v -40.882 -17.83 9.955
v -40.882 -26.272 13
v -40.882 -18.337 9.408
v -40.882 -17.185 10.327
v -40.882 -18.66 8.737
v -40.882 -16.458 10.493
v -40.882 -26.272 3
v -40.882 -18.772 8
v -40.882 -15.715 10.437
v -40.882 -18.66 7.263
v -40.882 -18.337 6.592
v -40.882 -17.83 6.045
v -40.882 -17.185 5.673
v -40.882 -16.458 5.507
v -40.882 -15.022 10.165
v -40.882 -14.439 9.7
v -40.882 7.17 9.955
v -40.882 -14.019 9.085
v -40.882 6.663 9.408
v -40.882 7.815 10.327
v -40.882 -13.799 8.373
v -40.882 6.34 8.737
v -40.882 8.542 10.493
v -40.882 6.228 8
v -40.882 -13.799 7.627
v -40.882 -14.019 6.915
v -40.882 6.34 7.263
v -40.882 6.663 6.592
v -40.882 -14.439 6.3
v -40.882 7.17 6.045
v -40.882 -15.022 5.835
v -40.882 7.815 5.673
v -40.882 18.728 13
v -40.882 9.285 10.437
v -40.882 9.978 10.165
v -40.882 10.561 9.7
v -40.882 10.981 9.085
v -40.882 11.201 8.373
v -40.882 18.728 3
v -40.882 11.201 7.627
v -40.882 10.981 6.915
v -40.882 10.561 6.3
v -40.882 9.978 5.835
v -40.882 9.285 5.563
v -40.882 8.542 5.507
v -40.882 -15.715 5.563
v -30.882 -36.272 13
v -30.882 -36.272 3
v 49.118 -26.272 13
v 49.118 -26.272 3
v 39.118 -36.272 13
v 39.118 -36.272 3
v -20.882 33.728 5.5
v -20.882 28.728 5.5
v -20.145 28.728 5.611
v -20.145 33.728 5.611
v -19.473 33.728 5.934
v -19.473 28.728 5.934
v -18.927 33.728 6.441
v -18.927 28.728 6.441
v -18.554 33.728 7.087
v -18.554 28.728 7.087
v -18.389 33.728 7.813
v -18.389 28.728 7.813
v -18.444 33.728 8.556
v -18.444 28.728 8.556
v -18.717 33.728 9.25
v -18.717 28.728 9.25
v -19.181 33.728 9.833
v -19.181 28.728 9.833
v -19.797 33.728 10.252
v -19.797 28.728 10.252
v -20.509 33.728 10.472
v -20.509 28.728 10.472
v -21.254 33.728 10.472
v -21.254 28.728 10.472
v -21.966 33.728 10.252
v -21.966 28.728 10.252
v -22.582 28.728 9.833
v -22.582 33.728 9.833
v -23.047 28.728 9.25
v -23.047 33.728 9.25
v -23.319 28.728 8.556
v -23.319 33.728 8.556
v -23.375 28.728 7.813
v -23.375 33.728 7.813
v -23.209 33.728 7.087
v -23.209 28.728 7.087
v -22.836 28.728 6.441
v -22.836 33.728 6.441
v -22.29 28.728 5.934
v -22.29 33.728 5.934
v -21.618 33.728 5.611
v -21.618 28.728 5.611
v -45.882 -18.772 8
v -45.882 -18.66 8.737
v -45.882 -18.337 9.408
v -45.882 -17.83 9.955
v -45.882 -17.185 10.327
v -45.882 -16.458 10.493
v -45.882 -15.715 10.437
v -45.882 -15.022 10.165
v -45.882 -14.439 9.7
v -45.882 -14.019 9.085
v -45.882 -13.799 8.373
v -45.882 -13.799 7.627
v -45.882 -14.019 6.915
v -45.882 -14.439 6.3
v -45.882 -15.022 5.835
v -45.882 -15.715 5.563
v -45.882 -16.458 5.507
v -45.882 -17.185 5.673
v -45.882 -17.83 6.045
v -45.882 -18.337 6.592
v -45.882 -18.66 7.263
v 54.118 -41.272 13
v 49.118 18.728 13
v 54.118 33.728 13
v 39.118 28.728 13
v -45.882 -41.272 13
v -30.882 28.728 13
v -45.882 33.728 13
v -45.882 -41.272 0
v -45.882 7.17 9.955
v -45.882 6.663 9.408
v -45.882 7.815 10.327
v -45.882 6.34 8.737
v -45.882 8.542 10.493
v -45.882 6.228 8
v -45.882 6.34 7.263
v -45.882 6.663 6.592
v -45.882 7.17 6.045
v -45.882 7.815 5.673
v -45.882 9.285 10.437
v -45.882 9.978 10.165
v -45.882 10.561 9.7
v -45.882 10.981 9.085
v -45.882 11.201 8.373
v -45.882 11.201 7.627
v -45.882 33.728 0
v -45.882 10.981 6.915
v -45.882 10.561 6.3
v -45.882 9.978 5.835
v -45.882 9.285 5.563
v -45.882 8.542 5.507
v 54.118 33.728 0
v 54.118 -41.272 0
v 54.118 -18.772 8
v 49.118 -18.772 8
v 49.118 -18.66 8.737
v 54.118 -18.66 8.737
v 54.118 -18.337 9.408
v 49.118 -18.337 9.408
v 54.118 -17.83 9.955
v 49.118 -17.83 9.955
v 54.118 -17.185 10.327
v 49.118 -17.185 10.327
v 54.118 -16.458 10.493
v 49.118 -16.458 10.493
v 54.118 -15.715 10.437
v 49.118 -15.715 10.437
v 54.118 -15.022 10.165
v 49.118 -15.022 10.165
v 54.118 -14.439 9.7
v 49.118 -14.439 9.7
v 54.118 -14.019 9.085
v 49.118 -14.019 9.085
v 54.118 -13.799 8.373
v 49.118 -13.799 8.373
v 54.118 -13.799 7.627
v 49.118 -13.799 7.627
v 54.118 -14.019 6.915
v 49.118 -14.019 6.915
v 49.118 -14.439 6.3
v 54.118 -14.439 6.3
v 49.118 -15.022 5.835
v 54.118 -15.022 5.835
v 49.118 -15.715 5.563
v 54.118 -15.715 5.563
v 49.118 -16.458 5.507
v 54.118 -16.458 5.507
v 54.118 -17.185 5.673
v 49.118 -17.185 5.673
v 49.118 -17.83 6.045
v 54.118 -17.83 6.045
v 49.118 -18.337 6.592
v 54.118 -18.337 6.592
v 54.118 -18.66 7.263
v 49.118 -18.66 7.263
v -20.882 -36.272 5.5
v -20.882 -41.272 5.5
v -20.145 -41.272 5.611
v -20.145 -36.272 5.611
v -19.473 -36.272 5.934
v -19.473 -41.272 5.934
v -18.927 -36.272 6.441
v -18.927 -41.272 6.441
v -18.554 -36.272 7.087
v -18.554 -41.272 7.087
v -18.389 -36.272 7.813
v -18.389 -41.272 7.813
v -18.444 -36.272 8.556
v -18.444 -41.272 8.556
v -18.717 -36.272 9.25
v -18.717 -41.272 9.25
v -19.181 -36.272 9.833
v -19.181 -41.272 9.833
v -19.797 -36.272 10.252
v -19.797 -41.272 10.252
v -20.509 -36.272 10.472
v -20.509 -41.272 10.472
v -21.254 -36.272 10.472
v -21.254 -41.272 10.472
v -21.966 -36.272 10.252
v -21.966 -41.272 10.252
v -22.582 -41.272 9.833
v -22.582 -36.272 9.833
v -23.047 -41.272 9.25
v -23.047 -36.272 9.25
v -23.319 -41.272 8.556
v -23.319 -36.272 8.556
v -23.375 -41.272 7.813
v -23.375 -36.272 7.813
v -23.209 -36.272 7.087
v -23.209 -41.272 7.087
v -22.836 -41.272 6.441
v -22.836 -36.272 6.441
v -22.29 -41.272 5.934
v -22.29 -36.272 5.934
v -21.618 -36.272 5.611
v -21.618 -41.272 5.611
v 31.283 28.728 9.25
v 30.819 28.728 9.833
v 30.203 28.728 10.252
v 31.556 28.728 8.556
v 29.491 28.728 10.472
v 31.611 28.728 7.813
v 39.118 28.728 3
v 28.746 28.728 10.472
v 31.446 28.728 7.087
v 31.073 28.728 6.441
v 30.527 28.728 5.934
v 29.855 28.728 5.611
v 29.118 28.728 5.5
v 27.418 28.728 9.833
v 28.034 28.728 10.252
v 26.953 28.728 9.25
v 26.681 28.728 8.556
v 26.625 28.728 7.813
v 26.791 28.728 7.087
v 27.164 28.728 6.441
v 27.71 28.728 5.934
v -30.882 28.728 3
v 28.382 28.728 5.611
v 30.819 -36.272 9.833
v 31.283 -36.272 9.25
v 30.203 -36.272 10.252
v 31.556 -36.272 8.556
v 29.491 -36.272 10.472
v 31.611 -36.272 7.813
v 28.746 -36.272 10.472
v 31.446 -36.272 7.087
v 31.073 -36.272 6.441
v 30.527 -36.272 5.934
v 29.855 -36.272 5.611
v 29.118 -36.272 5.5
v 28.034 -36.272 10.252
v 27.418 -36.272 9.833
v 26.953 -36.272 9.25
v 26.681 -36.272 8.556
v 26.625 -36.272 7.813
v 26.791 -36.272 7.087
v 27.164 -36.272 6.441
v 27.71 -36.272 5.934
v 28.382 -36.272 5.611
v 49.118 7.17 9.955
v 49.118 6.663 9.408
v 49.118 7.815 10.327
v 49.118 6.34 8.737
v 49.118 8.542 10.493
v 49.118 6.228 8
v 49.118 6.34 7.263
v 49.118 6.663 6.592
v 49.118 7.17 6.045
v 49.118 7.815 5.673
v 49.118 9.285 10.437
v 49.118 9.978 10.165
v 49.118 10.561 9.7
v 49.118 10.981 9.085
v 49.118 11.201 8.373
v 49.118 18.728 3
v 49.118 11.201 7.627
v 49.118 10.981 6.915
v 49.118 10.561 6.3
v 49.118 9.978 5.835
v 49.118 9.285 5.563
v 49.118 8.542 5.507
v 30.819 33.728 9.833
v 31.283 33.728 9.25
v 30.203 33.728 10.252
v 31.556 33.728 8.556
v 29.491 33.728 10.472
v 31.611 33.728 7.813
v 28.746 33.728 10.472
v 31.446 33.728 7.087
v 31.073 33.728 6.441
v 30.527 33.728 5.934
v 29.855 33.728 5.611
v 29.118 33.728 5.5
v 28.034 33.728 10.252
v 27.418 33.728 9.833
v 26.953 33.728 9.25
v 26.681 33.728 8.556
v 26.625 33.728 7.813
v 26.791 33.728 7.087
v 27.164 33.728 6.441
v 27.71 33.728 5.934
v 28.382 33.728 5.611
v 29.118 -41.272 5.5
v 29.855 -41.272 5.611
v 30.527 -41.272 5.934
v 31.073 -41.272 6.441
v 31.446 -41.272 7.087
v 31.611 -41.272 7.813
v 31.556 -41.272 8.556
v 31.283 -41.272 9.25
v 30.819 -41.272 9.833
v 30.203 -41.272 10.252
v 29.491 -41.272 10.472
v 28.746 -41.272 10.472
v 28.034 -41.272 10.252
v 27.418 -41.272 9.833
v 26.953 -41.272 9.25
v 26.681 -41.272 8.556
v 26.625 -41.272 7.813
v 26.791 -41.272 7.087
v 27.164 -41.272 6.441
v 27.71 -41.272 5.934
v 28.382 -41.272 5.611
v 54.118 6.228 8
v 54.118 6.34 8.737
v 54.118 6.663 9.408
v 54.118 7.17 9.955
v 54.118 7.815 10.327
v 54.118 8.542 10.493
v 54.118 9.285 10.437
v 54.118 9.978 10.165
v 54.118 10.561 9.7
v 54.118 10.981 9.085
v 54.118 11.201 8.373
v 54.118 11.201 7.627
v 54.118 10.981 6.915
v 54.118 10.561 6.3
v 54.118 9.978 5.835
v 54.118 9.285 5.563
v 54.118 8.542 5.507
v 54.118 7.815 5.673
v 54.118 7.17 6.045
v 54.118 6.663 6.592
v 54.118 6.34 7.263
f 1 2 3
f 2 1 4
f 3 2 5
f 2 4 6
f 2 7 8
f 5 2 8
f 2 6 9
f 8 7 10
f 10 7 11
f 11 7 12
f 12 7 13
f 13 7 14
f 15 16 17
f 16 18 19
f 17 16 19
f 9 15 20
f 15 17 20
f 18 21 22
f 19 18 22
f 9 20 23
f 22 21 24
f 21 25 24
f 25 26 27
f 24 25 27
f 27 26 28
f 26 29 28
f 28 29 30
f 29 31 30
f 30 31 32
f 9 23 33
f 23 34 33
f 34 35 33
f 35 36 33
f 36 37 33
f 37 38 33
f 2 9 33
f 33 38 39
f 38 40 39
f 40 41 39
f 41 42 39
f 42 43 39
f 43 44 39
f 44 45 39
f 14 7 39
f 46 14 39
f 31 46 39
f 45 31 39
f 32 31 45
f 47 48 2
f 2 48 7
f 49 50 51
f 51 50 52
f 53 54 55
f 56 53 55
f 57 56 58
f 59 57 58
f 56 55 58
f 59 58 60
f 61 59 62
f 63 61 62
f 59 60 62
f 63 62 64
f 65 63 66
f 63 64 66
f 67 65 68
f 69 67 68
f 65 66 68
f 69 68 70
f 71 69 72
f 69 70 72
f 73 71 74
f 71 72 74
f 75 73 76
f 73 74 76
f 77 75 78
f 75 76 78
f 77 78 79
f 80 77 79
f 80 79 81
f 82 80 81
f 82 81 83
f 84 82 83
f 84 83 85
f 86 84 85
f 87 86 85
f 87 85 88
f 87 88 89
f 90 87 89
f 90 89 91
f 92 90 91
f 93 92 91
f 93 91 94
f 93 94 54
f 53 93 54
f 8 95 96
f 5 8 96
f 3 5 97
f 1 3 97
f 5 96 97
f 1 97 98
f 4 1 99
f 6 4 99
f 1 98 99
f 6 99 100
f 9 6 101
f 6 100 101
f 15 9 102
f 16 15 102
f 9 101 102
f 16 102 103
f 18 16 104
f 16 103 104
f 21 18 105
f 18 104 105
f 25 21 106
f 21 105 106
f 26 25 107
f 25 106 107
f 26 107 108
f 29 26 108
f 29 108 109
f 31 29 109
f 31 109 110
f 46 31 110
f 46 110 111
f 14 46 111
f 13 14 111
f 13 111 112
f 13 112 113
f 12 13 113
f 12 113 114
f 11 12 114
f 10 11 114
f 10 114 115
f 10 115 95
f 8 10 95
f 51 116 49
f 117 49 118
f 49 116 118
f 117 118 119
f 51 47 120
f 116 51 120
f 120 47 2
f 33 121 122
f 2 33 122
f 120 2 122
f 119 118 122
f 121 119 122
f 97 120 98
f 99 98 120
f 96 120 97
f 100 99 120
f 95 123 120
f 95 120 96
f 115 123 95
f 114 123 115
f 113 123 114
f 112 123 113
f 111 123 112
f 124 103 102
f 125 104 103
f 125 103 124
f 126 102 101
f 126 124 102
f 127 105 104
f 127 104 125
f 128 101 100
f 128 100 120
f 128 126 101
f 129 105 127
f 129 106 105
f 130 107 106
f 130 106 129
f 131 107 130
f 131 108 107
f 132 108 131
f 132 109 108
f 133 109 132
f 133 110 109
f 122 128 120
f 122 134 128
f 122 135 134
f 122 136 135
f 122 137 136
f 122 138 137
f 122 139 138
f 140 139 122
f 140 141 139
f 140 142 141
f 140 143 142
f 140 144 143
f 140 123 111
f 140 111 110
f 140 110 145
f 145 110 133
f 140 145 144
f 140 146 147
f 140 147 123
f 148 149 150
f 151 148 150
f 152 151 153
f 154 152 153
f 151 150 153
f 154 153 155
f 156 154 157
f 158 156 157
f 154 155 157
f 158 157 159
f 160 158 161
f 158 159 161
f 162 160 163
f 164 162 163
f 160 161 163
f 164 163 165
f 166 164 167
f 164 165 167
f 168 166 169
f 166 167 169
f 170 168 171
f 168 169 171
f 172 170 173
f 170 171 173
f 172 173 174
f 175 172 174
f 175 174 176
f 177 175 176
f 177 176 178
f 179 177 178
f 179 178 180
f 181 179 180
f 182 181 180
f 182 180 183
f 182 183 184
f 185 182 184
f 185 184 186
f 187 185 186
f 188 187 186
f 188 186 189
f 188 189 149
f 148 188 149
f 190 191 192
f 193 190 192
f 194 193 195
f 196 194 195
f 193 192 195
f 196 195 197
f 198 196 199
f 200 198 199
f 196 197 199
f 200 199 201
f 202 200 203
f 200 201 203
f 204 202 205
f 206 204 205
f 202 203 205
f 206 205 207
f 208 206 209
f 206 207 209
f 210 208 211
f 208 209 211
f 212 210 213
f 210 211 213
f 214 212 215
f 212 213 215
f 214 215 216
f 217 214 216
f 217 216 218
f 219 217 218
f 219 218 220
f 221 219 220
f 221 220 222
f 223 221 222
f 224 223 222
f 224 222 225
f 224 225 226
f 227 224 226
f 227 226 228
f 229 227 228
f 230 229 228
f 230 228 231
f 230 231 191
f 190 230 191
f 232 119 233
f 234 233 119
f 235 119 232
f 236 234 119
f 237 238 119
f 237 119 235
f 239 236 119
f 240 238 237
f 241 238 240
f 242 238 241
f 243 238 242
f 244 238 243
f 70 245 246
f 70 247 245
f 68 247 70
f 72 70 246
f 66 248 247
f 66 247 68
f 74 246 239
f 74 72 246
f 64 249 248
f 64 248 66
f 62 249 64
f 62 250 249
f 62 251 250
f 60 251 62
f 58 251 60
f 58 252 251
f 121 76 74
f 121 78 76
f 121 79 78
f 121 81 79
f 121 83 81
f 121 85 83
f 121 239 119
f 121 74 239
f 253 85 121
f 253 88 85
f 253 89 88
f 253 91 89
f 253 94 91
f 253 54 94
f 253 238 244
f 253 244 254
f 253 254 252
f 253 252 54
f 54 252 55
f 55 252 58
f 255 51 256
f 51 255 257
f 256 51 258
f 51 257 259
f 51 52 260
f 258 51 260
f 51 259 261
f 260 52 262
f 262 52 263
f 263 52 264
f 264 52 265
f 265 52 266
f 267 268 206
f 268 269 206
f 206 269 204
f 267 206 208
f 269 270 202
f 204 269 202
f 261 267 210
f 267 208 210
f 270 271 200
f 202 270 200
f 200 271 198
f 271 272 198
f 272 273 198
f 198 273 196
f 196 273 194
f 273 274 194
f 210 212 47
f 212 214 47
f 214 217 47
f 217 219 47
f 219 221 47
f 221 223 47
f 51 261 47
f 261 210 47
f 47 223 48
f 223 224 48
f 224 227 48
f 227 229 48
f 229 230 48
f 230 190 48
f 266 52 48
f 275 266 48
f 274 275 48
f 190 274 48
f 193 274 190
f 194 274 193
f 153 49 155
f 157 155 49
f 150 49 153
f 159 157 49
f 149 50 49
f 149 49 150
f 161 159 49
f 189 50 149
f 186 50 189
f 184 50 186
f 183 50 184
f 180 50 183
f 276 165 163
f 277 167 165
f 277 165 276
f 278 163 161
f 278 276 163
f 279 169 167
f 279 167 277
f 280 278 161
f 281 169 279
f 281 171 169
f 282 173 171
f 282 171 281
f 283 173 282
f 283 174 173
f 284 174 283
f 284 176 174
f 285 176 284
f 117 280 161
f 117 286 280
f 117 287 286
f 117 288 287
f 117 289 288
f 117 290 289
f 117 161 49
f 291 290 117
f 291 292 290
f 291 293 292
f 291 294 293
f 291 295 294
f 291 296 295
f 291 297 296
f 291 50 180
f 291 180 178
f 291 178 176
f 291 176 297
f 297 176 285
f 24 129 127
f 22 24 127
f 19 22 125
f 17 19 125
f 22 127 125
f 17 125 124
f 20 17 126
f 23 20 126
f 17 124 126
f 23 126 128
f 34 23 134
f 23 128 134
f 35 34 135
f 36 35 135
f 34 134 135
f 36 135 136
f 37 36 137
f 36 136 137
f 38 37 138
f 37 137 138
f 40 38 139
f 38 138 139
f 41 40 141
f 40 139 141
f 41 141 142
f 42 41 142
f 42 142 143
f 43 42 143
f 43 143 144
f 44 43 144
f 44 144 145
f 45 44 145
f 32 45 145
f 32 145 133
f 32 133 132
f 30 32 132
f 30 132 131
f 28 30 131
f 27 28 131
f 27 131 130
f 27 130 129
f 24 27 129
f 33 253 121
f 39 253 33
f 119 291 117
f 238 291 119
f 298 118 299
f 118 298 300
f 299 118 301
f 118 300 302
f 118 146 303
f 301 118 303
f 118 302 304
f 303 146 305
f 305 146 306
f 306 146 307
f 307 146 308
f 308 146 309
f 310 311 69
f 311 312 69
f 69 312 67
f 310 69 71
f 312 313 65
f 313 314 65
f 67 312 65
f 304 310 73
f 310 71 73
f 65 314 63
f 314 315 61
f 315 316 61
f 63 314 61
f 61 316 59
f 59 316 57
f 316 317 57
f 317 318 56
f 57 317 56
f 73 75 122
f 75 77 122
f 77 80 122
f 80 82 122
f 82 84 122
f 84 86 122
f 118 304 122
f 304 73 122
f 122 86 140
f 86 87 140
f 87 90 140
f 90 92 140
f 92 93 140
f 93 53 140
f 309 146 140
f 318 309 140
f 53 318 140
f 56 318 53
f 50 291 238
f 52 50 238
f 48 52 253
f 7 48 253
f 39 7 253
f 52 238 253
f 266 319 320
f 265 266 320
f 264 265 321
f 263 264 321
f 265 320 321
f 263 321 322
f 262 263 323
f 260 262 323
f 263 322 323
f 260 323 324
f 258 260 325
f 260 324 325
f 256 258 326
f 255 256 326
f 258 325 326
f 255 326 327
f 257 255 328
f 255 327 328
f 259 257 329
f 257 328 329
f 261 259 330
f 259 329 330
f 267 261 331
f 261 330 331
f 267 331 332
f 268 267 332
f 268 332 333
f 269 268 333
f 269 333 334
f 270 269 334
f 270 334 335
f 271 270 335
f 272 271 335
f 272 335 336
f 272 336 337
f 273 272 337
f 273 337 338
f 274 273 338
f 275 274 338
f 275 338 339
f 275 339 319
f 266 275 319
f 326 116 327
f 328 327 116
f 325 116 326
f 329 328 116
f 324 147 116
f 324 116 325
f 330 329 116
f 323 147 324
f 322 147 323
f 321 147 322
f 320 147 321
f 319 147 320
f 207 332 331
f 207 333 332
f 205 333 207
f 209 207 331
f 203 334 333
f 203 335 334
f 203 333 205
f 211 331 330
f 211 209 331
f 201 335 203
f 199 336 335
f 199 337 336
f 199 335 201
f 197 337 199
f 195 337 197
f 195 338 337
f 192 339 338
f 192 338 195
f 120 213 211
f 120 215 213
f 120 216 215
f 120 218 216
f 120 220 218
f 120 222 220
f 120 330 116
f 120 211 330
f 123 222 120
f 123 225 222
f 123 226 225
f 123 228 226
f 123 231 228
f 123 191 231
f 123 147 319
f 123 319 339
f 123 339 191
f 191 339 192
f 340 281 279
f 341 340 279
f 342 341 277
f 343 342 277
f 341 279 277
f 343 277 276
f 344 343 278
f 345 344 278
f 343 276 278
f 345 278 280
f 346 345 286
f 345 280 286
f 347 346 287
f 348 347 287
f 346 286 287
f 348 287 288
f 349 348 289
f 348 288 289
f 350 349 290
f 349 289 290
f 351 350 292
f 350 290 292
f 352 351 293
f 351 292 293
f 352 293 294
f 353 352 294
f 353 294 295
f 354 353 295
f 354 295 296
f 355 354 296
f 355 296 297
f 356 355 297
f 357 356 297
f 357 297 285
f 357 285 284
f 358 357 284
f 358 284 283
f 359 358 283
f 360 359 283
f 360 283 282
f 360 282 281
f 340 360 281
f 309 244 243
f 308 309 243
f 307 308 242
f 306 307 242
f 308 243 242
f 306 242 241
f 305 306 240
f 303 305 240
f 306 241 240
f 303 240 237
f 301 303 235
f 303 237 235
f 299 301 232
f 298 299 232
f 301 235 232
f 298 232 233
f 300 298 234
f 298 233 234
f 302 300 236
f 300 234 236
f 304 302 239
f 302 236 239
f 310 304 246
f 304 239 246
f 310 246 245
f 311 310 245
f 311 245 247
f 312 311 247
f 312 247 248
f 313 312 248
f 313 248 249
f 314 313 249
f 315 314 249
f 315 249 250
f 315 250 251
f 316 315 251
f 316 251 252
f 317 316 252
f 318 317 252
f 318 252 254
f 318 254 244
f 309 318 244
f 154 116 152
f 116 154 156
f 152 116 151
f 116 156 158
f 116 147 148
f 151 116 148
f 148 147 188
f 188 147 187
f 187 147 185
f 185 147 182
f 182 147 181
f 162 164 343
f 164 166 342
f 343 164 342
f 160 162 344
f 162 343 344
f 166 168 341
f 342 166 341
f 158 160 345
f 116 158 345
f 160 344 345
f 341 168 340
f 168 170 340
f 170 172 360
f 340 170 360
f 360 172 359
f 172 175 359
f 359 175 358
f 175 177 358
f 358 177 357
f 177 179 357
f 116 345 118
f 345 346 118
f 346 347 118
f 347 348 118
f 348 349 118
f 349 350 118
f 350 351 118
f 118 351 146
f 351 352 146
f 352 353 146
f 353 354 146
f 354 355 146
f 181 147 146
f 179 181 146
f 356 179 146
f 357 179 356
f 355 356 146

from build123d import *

# Parameters (mm, degrees)
BOSS_EXTRU_1_DEPTH        = 13
COQUE1_T                  = -5
COQUE1_THICKNESS_2_FACE_W = 90
COQUE1_THICKNESS_2_FACE_H = 65
COQUE1_THICKNESS_2_DEPTH  = 2
ENL_V_MAT_EXTRU_1_REACH   = 110.96
ESQUISSE2_R               = 2.5
ENL_V_MAT_EXTRU_2_REACH   = 95.396
ESQUISSE3_R               = 2.5
BOSS_EXTRU_2_DEPTH        = 10


with BuildPart() as part:
    # Esquisse1 → Boss.-Extru.1 (new body)
    with BuildSketch(Plane.XY):
        Polygon((44.118436308, 33.728448276), (54.118436308, 33.728448276), (54.118436308, 23.728448276), (54.118436308, -41.271551724), (-45.881563692, -41.271551724), (-45.881563692, 33.728448276), align=None)
    extrude(amount=BOSS_EXTRU_1_DEPTH)

    # Coque1
    coque1_openings = [part.faces().sort_by_distance(p)[0] for p in [
        (4.118436308, -3.771551724, 13),
    ]]
    offset(amount=COQUE1_T, openings=coque1_openings, kind=Kind.INTERSECTION)

    # Coque1 thickness 2 face (on inner face of the shell) → Coque1 thickness 2 (cut)
    with BuildSketch(Plane(origin=(4.118436308, -3.771551724, 5), x_dir=(-1, 0, 0), z_dir=(0, 0, -1))):
        Rectangle(COQUE1_THICKNESS_2_FACE_W, COQUE1_THICKNESS_2_FACE_H)
    extrude(amount=COQUE1_THICKNESS_2_DEPTH, mode=Mode.SUBTRACT)

    # Enlèv. mat.-Extru.1: up to this face of the body (flat: up to its plane)
    enl_v_mat_extru_1_end = Plane(part.part.faces().sort_by_distance((54.118436308, -3.771551724, 6.5))[0])
    # Esquisse2 → Enlèv. mat.-Extru.1 (cut, up to the picked face)
    with BuildSketch(Plane.ZY.offset(45.881563692), mode=Mode.PRIVATE) as enl_v_mat_extru_1_sk1:
        with Locations(Location((8, -16.271551724, 0), (0, 0, 270))):
            Circle(ESQUISSE2_R)
    enl_v_mat_extru_1_tool1 = split(extrude(enl_v_mat_extru_1_sk1.sketch, amount=-ENL_V_MAT_EXTRU_1_REACH, mode=Mode.PRIVATE), bisect_by=enl_v_mat_extru_1_end, keep=Keep.BOTH, mode=Mode.PRIVATE)
    # Esquisse2 → Enlèv. mat.-Extru.1 (cut, up to the picked face)
    with BuildSketch(Plane.ZY.offset(45.881563692), mode=Mode.PRIVATE) as enl_v_mat_extru_1_sk2:
        with Locations(Location((8, 8.728448276, 0), (0, 0, 270))):
            Circle(ESQUISSE2_R)
    enl_v_mat_extru_1_tool2 = split(extrude(enl_v_mat_extru_1_sk2.sketch, amount=-ENL_V_MAT_EXTRU_1_REACH, mode=Mode.PRIVATE), bisect_by=enl_v_mat_extru_1_end, keep=Keep.BOTH, mode=Mode.PRIVATE)
    add(enl_v_mat_extru_1_tool1.solids().sort_by(Axis((-45.881564, -16.271552, 8), (1, 0, 0)))[0], mode=Mode.SUBTRACT)
    add(enl_v_mat_extru_1_tool2.solids().sort_by(Axis((-45.881564, 8.728448, 8), (1, 0, 0)))[0], mode=Mode.SUBTRACT)

    # Enlèv. mat.-Extru.2: up to this face of the body (flat: up to its plane)
    enl_v_mat_extru_2_end = Plane(part.part.faces().sort_by_distance((4.118436308, 33.728448276, 6.5))[0])
    # Esquisse3 → Enlèv. mat.-Extru.2 (cut, up to the picked face)
    with BuildSketch(Plane.XZ.offset(41.271551724), mode=Mode.PRIVATE) as enl_v_mat_extru_2_sk1:
        with Locations(Location((-20.881563692, 8, 0), (0, 0, 270))):
            Circle(ESQUISSE3_R)
    enl_v_mat_extru_2_tool1 = split(extrude(enl_v_mat_extru_2_sk1.sketch, amount=-ENL_V_MAT_EXTRU_2_REACH, mode=Mode.PRIVATE), bisect_by=enl_v_mat_extru_2_end, keep=Keep.BOTH, mode=Mode.PRIVATE)
    # Esquisse3 → Enlèv. mat.-Extru.2 (cut, up to the picked face)
    with BuildSketch(Plane.XZ.offset(41.271551724), mode=Mode.PRIVATE) as enl_v_mat_extru_2_sk2:
        with Locations(Location((29.118436308, 8, 0), (0, 0, 270))):
            Circle(ESQUISSE3_R)
    enl_v_mat_extru_2_tool2 = split(extrude(enl_v_mat_extru_2_sk2.sketch, amount=-ENL_V_MAT_EXTRU_2_REACH, mode=Mode.PRIVATE), bisect_by=enl_v_mat_extru_2_end, keep=Keep.BOTH, mode=Mode.PRIVATE)
    add(enl_v_mat_extru_2_tool1.solids().sort_by(Axis((-20.881564, -41.271552, 8), (0, 1, 0)))[0], mode=Mode.SUBTRACT)
    add(enl_v_mat_extru_2_tool2.solids().sort_by(Axis((29.118436, -41.271552, 8), (0, 1, 0)))[0], mode=Mode.SUBTRACT)

    # Esquisse4 → Boss.-Extru.2 (add)
    with BuildSketch(Plane.XY.offset(3)):
        Polygon((-30.881563692, 28.728448276), (-40.881563692, 18.728448276), (-40.881563692, 28.728448276), align=None)
        Polygon((49.118436308, 28.728448276), (49.118436308, 18.728448276), (39.118436308, 28.728448276), align=None)
        Polygon((49.118436308, -36.271551724), (49.118436308, -26.271551724), (39.118436308, -36.271551724), align=None)
        Polygon((-30.881563692, -36.271551724), (-40.881563692, -26.271551724), (-40.881563692, -36.271551724), align=None)
    extrude(amount=BOSS_EXTRU_2_DEPTH)


solid = part.part
